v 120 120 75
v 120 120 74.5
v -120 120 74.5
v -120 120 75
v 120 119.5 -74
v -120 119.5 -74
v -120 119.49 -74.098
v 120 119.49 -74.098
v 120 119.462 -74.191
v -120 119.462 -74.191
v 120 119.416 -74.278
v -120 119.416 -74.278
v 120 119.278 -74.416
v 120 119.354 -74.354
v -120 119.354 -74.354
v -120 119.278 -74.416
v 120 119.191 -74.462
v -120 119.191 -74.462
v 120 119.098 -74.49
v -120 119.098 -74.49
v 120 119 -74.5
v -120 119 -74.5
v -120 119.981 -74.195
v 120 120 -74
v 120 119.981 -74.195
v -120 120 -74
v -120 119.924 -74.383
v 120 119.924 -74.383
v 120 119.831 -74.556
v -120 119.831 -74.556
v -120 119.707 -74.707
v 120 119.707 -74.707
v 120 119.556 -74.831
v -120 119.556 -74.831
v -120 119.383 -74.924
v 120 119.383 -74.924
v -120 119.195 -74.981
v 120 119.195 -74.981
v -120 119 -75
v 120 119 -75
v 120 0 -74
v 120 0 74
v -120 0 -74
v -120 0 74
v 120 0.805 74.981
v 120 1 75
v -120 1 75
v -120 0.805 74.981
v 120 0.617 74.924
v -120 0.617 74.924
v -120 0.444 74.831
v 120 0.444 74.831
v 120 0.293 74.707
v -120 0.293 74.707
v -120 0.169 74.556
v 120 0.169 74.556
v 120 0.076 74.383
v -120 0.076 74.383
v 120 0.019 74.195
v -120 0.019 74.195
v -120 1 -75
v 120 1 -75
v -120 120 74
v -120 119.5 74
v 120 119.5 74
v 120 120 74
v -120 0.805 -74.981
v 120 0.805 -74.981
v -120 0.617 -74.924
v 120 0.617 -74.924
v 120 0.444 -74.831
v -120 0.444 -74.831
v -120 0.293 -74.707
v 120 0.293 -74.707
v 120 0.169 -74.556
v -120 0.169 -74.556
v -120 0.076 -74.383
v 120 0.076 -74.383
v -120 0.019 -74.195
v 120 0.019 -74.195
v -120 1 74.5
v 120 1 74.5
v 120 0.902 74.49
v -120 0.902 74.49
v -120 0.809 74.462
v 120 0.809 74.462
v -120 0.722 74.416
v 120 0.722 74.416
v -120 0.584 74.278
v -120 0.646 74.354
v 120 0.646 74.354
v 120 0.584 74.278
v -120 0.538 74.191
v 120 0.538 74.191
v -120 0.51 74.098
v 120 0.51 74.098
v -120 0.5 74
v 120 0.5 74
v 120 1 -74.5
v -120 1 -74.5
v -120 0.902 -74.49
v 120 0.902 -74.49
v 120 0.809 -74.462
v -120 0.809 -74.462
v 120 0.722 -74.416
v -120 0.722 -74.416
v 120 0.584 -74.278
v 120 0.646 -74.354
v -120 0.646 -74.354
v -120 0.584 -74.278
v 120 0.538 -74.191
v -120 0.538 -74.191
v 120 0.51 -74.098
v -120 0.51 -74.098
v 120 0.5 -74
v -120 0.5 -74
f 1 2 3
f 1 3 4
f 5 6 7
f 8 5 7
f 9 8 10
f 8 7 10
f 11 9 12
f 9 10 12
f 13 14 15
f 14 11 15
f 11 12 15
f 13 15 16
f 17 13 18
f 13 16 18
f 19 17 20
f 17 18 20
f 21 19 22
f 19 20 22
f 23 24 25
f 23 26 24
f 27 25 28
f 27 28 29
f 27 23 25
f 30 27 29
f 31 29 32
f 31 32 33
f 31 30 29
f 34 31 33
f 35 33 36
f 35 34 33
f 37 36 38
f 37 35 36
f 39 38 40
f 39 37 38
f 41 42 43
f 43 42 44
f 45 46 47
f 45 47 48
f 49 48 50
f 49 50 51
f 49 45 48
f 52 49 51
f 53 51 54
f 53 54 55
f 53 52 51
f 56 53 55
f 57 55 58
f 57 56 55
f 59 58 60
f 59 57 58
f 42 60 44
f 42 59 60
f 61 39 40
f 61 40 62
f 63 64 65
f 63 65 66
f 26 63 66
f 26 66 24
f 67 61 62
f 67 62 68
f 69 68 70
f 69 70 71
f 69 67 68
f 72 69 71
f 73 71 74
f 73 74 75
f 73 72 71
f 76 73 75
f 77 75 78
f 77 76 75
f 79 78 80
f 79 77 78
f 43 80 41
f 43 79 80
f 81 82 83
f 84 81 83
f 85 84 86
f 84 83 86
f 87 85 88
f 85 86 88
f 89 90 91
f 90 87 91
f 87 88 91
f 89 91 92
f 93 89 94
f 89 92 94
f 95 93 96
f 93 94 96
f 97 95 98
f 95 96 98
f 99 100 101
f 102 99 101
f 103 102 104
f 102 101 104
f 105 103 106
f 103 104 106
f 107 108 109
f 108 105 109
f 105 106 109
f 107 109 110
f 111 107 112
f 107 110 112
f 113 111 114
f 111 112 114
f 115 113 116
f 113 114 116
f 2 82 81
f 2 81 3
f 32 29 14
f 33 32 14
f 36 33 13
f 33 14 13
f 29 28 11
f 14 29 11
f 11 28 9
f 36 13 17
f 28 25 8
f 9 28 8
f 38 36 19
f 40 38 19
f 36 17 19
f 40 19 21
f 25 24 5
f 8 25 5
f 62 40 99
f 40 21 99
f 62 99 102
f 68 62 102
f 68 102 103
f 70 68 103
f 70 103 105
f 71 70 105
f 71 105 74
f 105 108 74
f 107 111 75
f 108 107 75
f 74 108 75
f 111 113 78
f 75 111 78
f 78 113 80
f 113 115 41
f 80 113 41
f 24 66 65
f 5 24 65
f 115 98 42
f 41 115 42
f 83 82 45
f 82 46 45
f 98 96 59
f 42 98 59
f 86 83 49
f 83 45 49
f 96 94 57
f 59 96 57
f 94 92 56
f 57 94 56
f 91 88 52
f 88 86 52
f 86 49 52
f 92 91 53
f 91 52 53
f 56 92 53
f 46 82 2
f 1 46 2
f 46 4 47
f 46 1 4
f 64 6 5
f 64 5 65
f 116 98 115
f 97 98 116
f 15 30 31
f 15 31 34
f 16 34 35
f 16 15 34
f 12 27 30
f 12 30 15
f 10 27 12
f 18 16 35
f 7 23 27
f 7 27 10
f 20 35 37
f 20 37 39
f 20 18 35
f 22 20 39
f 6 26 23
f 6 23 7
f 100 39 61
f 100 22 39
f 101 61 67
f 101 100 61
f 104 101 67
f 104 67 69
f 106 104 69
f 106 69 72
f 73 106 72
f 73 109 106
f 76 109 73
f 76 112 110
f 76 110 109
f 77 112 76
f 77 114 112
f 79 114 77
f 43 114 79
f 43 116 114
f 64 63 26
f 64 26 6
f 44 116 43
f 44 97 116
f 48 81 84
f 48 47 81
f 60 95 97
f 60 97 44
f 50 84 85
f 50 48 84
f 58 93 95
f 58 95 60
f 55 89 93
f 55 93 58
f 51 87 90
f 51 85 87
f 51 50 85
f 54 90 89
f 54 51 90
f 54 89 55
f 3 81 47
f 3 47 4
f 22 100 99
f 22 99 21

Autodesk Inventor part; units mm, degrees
ref_plane "YZ Plane" through (0, 0, 0) normal (1, 0, 0) x (0, 1, 0)
ref_plane "XZ Plane" through (0, 0, 0) normal (0, 1, 0) x (-1, 0, 0)
ref_plane "XY Plane" through (0, 0, 0) normal (0, 0, 1) x (1, 0, 0)
sketch "Sketch1" plane through (0, 0, 0) normal (0, 1, 0) x (-1, 0, 0)
  line L0 (-120, 75) -> (120, 75)
  line L1 (120, 75) -> (120, -75)
  line L2 (120, -75) -> (-120, -75)
  line L3 (-120, -75) -> (-120, 75)
  line L4 (-120, 75) -> (120, -75) construction
  line L5 (120, 75) -> (-120, -75) construction
  point P0 (0, 0)
  dimension "d0" = 150
  dimension "d1" = 240
extrude "Plate1" add sketch "Sketch1" along normal blind 0.5
sketch "Sketch4" plane through (120, 0, 74.5) normal (0, 0, 1) x (1, 0, 0)
  line L0 (-240, 0) -> (0, 0)
  line L1 (0, 0) -> (0, 120)
  line L2 (0, 120) -> (-240, 120)
  line L3 (-240, 120) -> (-240, 0)
edge flange "Flange1" height 120 angle 90 thickness 0.5 bend radius 0.5 thickness toward (0, 0, 1) relief tear relief width 0.5 relief depth 0.25 edges at (0, 0.5, 75) wall of the first edge with corners at (-120, 0, 74.5) (120, 0, 74.5) (120, 120, 74.5) (-120, 120, 74.5)
bend "Bend1"
corner "Corner1"
sketch "Sketch5" plane through (-120, 0, -74.5) normal (0, 0, -1) x (-1, 0, 0)
  line L0 (-240, 0) -> (0, 0)
  line L1 (0, 0) -> (0, 120)
  line L2 (0, 120) -> (-240, 120)
  line L3 (-240, 120) -> (-240, 0)
edge flange "Flange2" height 120 angle 90 thickness 0.5 bend radius 0.5 thickness toward (0, 0, -1) relief tear relief width 0.5 relief depth 0.25 edges at (0, 0.5, -75) wall of the first edge with corners at (120, 0, -74.5) (-120, 0, -74.5) (-120, 120, -74.5) (120, 120, -74.5)
bend "Bend2"
corner "Corner2"
sketch "Sketch6" plane through (-120, 119.5, -75) normal (0, 1, 0) x (-1, 0, 0)
  line L0 (-240, 0) -> (0, 0)
  line L1 (0, 0) -> (0, 149)
  line L2 (0, 149) -> (-240, 149)
  line L3 (-240, 149) -> (-240, 0)
edge flange "Flange3" height 149 angle 90 thickness 0.5 bend radius 0.5 thickness toward (0, 1, 0) relief tear relief width 0.5 relief depth 0.25 edges at (0, 120, -74.5) wall of the first edge with corners at (120, 119.5, -75) (-120, 119.5, -75) (-120, 119.5, 74) (120, 119.5, 74)
bend "Bend3"
corner "Corner3"
equation "\"d2\" = Thickness"
equation "\"d12\" = BendReliefWidth"
equation "\"d13\" = BendReliefDepth"
equation "\"d14\" = MinimumRemnant"
equation "\"d15\" = TransitionRadius"
equation "\"d18\" = BendRadius"
equation "\"d19\" = CornerReliefSize"
equation "\"d20\" = GapSize"
equation "\"d21\" = JacobiRadiusSize"
equation "\"d22\" = BendReliefWidth"
equation "\"d23\" = BendReliefDepth"
equation "\"d24\" = MinimumRemnant"
equation "\"d25\" = TransitionRadius"
equation "\"d28\" = BendRadius"
equation "\"d29\" = CornerReliefSize"
equation "\"d30\" = GapSize"
equation "\"d31\" = JacobiRadiusSize"
equation "\"d32\" = BendReliefWidth"
equation "\"d33\" = BendReliefDepth"
equation "\"d34\" = MinimumRemnant"
equation "\"d35\" = TransitionRadius"
equation "\"d38\" = BendRadius"
equation "\"d39\" = CornerReliefSize"
equation "\"d40\" = GapSize"
equation "\"d41\" = JacobiRadiusSize"
equation "\"BendRadius\" = Thickness"
equation "\"BendReliefWidth\" = Thickness"
equation "\"BendReliefDepth\" = 0.5 * Thickness"
equation "\"CornerReliefSize\" = 4 * Thickness"
equation "\"MinimumRemnant\" = 2 * Thickness"
equation "\"TransitionRadius\" = BendRadius"
equation "\"JacobiRadiusSize\" = BendRadius"
equation "\"GapSize\" = Thickness"
equation "\"Thickness\" = 0.5"
properties part number "Reflector"
